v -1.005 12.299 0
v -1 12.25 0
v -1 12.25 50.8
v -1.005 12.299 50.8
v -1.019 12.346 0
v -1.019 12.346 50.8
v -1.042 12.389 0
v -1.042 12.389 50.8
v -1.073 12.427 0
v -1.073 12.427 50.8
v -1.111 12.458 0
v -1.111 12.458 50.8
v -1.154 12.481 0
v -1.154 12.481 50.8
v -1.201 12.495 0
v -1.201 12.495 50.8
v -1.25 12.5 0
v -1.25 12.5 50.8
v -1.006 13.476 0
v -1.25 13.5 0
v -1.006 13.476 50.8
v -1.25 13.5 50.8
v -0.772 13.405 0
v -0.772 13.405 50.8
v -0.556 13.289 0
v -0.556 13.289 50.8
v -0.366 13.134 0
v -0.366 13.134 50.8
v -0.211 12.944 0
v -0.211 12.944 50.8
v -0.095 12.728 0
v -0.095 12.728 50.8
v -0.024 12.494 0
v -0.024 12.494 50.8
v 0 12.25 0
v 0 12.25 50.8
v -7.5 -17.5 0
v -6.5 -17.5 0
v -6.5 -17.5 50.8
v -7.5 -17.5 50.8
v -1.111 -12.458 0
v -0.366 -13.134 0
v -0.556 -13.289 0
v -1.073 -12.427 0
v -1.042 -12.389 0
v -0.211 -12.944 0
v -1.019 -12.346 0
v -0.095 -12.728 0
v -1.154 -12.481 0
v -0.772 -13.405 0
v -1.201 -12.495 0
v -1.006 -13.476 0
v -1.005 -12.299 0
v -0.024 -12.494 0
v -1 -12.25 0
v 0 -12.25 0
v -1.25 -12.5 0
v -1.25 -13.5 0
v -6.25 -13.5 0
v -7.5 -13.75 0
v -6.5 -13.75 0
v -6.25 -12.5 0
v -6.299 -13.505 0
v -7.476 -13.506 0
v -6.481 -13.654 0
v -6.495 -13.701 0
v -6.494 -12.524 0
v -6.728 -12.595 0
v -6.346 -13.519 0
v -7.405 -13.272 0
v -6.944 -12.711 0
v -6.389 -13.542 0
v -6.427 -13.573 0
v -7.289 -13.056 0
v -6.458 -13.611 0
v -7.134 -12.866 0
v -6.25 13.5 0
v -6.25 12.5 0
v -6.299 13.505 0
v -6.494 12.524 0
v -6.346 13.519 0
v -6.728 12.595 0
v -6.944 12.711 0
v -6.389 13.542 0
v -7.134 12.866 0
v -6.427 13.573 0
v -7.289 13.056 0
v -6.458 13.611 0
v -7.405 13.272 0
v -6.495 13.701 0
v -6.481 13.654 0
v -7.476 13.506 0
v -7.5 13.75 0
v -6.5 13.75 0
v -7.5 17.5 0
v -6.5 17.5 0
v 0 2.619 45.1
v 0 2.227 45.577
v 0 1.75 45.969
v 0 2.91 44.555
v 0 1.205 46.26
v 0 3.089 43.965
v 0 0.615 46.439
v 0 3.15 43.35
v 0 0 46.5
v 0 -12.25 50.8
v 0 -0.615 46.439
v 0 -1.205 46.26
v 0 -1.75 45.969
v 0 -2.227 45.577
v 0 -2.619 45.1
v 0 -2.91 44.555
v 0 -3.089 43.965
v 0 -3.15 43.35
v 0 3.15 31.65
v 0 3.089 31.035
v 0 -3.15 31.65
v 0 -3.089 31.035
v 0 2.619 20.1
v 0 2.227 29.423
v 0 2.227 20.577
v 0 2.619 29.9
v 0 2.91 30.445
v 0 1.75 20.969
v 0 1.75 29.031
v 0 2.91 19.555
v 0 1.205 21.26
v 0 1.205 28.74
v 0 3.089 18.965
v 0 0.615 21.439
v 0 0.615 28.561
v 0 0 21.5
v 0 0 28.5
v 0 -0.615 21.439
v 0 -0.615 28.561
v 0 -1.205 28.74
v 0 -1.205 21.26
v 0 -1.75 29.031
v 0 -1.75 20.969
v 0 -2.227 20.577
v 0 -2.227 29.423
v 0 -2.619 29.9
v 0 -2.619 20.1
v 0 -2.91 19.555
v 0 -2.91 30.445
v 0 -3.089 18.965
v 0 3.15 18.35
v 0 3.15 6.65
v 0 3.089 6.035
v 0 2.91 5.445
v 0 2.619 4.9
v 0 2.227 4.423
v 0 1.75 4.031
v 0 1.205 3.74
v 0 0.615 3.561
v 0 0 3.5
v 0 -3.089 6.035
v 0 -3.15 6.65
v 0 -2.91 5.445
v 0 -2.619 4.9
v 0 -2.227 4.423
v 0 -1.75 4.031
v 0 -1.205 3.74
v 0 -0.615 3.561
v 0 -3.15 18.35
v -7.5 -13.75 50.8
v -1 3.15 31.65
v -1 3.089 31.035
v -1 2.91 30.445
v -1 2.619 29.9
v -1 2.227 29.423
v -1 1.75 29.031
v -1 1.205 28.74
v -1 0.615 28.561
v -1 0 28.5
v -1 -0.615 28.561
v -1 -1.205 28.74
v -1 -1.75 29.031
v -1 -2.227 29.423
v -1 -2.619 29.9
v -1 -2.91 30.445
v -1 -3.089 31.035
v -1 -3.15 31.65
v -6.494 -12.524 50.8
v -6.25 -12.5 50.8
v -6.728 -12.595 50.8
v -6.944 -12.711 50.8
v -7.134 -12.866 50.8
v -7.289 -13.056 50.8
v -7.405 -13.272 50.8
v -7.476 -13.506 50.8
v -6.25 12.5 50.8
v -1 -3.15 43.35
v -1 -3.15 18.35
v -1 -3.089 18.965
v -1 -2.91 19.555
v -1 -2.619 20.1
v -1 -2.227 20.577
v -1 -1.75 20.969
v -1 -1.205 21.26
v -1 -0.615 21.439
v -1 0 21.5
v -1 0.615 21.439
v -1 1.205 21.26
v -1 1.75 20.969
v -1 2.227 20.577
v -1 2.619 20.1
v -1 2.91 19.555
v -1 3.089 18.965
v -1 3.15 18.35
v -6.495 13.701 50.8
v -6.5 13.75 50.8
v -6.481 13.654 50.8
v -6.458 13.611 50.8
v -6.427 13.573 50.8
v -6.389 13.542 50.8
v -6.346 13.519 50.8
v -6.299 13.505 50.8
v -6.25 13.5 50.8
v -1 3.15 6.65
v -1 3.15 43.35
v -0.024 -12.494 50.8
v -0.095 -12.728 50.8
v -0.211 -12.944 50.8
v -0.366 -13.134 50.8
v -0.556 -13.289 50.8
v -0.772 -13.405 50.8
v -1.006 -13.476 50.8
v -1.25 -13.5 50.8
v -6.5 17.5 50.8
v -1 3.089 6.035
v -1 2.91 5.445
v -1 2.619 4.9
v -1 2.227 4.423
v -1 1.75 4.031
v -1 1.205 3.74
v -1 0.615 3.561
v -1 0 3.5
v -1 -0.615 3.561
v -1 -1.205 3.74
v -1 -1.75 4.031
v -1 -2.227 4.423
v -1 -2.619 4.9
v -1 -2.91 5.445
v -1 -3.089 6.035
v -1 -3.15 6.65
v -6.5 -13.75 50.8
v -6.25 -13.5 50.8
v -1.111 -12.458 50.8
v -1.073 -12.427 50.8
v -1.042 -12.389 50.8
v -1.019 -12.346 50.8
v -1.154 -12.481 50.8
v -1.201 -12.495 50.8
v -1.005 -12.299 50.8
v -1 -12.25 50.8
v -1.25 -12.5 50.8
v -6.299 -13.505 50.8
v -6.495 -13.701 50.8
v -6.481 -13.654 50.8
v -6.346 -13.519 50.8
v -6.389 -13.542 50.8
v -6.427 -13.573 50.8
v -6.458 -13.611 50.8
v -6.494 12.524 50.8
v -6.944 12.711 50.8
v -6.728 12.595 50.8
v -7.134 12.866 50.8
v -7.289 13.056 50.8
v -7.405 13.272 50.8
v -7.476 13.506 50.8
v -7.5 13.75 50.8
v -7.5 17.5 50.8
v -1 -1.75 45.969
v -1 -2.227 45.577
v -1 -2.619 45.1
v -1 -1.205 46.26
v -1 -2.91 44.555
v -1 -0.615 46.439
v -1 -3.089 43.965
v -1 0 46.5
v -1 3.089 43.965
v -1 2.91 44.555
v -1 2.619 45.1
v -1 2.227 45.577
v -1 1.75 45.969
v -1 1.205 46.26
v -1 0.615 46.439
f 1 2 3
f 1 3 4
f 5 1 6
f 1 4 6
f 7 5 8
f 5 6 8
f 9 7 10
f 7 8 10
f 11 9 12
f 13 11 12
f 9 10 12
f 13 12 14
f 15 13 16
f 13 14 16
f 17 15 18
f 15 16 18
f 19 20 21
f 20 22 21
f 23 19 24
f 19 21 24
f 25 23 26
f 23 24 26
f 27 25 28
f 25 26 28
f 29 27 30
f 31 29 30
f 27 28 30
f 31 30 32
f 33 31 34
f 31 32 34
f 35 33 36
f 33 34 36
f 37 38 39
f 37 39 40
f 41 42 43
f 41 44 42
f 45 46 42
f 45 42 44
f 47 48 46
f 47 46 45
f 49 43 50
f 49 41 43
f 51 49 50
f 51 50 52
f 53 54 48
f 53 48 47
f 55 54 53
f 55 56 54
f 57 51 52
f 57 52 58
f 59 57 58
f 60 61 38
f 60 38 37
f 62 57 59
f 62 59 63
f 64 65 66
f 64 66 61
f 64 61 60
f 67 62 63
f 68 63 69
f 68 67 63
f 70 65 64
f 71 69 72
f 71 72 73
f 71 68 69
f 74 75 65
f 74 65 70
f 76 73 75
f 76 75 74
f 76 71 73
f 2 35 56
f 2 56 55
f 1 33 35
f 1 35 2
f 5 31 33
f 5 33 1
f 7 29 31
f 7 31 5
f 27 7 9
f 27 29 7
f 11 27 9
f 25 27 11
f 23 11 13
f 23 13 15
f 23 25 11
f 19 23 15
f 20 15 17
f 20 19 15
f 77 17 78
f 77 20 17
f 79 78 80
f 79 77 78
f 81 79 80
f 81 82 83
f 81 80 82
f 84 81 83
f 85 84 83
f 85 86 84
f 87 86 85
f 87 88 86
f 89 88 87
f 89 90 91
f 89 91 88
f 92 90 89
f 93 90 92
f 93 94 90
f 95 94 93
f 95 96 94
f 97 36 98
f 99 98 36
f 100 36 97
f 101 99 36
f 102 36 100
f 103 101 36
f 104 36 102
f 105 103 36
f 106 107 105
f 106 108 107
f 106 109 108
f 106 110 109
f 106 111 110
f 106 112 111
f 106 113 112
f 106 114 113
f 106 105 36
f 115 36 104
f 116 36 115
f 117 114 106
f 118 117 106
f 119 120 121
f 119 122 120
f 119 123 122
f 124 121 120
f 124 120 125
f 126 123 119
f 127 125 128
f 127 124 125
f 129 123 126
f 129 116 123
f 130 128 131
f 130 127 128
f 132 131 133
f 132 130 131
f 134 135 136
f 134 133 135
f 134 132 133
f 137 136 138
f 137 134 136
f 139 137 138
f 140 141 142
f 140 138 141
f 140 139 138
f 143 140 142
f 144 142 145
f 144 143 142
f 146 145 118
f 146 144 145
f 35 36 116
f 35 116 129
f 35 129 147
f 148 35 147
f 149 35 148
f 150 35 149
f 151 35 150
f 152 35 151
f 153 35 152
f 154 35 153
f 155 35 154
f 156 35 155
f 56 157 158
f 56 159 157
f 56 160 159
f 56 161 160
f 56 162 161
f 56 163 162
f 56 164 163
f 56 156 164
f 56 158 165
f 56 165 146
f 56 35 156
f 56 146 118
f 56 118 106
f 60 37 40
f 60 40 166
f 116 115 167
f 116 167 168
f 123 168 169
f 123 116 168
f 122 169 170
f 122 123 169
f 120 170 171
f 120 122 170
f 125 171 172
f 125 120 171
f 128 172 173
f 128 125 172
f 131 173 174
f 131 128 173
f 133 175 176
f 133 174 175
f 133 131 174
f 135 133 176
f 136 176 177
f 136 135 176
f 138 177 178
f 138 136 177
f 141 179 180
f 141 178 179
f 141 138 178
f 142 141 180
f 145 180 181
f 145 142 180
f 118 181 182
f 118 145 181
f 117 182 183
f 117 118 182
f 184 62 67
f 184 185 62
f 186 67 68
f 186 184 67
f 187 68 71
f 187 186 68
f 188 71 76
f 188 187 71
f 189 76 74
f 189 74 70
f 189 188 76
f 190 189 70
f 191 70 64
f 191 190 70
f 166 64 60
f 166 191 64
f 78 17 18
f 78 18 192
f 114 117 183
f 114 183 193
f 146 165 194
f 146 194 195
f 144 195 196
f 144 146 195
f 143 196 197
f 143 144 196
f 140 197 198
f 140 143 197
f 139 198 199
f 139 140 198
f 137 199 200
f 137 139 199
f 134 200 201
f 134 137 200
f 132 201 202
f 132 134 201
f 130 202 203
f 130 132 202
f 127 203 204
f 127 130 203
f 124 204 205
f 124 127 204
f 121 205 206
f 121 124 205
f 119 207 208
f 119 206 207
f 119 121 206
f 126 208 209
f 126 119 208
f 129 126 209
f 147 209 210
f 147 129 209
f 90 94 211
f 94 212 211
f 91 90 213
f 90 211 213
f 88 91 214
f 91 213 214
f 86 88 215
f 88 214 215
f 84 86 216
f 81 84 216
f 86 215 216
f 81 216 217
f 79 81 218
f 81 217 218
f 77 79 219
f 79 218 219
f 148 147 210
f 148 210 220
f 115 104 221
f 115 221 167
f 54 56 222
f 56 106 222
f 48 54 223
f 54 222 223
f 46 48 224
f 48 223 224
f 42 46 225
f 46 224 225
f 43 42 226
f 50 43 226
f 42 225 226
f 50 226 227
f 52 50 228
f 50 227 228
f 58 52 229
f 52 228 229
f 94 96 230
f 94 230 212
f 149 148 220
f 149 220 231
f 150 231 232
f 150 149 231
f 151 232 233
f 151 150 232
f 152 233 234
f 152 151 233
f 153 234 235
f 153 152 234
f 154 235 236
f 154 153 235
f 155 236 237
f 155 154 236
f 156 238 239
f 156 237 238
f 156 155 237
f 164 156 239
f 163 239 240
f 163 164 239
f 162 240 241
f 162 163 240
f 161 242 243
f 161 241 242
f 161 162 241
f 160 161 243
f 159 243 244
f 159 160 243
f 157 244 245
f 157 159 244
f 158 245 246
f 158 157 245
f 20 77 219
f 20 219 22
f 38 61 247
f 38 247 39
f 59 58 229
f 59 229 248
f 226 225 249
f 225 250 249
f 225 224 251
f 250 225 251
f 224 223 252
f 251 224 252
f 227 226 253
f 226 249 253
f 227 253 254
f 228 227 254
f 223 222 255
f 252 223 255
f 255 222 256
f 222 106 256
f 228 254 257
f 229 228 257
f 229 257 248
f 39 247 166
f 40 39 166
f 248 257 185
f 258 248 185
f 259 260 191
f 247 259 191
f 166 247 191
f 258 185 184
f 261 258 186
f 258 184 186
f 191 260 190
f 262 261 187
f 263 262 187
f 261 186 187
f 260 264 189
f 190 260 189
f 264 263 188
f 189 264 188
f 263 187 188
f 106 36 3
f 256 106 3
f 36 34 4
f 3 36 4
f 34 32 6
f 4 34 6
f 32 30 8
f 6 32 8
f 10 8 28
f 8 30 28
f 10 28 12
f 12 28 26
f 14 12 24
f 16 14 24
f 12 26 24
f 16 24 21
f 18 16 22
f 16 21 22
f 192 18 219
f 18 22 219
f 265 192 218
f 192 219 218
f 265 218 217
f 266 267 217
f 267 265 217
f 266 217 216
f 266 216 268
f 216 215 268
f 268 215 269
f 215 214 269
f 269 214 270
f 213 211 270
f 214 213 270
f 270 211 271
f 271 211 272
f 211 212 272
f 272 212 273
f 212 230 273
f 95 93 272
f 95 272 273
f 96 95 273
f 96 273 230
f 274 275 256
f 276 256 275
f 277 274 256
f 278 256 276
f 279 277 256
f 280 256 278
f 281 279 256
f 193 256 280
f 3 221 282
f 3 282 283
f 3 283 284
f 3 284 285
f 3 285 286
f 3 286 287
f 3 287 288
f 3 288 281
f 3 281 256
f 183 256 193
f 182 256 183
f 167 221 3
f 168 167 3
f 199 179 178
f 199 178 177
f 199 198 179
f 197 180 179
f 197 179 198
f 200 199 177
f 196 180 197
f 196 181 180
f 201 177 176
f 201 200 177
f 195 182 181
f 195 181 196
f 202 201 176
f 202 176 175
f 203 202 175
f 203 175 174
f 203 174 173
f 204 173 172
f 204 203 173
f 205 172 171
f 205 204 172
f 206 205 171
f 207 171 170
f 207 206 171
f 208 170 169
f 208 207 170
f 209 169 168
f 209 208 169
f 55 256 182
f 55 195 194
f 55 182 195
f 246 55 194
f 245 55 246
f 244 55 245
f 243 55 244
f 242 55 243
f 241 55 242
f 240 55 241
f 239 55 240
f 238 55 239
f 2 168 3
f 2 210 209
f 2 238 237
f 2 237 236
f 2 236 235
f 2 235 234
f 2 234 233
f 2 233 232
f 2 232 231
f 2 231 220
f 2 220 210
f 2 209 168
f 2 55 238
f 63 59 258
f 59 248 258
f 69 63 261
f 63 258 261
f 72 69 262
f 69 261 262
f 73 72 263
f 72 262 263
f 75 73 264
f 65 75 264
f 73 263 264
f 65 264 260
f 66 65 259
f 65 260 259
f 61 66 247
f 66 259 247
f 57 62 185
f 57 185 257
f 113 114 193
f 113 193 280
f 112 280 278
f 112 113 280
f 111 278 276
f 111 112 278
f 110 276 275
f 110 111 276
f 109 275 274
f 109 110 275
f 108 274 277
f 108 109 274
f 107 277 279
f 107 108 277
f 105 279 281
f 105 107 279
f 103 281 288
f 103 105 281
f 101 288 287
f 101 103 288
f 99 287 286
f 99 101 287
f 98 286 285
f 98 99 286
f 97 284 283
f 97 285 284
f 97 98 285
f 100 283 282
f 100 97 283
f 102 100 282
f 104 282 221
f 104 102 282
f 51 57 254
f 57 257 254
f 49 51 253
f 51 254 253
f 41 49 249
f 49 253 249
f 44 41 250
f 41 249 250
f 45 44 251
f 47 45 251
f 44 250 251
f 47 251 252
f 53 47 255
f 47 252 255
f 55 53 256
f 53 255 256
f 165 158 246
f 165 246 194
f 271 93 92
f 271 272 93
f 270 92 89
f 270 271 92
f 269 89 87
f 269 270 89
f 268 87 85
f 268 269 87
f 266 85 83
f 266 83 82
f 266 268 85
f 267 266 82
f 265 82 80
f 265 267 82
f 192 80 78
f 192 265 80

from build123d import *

# Parameters (mm, degrees)
EXTRUDE_THIN1_DEPTH = 50.8
CUT_EXTRUDE1_DEPTH  = 55.250714281
LPATTERN1_COUNT     = 2
LPATTERN1_PITCH     = 25
FILLET1_R           = 0.25
FILLET2_R           = 1.25


with BuildPart() as part:
    # Sketch3 → Extrude-Thin1 (new body)
    with BuildSketch(Plane.XY):
        Polygon((-6.5, 17.5), (-6.5, 13.5), (0, 13.5), (0, -13.5), (-6.5, -13.5), (-6.5, -17.5), (-7.5, -17.5), (-7.5, -12.5), (-1, -12.5), (-1, 12.5), (-7.5, 12.5), (-7.5, 17.5), align=None)
    extrude(amount=EXTRUDE_THIN1_DEPTH)

    # Sketch4 → Cut-Extrude1 (cut, symmetric)
    with BuildSketch(Plane(origin=(0, 0, 0), x_dir=(0, 0, -1), z_dir=(1, 0, 0))):
        with BuildLine():
            Line((-6.65, -3.15), (-18.35, -3.15))
            ThreePointArc((-18.35, -3.15), (-21.5, 0), (-18.35, 3.15))
            Line((-18.35, 3.15), (-6.65, 3.15))
            ThreePointArc((-6.65, 3.15), (-3.5, 0), (-6.65, -3.15))
        make_face()
    cut_extrude1 = extrude(amount=CUT_EXTRUDE1_DEPTH, both=True, mode=Mode.SUBTRACT)

    # LPattern1: Cut-Extrude1 ×2
    with Locations(*[(0, 0, i * LPATTERN1_PITCH) for i in range(1, LPATTERN1_COUNT)]):
        add(cut_extrude1, mode=Mode.SUBTRACT)

    # Fillet1
    fillet1_edges = [part.edges().sort_by_distance(p)[0] for p in [
        (-6.5, 13.5, 25.4),
        (-6.5, -13.5, 25.4),
        (-1, -12.5, 25.4),
        (-1, 12.5, 25.4),
    ]]
    fillet(fillet1_edges, radius=FILLET1_R)

    # Fillet2
    fillet2_edges = [part.edges().sort_by_distance(p)[0] for p in [
        (0, 13.5, 25.4),
        (0, -13.5, 25.4),
        (-7.5, -12.5, 25.4),
        (-7.5, 12.5, 25.4),
    ]]
    fillet(fillet2_edges, radius=FILLET2_R)


solid = part.part
